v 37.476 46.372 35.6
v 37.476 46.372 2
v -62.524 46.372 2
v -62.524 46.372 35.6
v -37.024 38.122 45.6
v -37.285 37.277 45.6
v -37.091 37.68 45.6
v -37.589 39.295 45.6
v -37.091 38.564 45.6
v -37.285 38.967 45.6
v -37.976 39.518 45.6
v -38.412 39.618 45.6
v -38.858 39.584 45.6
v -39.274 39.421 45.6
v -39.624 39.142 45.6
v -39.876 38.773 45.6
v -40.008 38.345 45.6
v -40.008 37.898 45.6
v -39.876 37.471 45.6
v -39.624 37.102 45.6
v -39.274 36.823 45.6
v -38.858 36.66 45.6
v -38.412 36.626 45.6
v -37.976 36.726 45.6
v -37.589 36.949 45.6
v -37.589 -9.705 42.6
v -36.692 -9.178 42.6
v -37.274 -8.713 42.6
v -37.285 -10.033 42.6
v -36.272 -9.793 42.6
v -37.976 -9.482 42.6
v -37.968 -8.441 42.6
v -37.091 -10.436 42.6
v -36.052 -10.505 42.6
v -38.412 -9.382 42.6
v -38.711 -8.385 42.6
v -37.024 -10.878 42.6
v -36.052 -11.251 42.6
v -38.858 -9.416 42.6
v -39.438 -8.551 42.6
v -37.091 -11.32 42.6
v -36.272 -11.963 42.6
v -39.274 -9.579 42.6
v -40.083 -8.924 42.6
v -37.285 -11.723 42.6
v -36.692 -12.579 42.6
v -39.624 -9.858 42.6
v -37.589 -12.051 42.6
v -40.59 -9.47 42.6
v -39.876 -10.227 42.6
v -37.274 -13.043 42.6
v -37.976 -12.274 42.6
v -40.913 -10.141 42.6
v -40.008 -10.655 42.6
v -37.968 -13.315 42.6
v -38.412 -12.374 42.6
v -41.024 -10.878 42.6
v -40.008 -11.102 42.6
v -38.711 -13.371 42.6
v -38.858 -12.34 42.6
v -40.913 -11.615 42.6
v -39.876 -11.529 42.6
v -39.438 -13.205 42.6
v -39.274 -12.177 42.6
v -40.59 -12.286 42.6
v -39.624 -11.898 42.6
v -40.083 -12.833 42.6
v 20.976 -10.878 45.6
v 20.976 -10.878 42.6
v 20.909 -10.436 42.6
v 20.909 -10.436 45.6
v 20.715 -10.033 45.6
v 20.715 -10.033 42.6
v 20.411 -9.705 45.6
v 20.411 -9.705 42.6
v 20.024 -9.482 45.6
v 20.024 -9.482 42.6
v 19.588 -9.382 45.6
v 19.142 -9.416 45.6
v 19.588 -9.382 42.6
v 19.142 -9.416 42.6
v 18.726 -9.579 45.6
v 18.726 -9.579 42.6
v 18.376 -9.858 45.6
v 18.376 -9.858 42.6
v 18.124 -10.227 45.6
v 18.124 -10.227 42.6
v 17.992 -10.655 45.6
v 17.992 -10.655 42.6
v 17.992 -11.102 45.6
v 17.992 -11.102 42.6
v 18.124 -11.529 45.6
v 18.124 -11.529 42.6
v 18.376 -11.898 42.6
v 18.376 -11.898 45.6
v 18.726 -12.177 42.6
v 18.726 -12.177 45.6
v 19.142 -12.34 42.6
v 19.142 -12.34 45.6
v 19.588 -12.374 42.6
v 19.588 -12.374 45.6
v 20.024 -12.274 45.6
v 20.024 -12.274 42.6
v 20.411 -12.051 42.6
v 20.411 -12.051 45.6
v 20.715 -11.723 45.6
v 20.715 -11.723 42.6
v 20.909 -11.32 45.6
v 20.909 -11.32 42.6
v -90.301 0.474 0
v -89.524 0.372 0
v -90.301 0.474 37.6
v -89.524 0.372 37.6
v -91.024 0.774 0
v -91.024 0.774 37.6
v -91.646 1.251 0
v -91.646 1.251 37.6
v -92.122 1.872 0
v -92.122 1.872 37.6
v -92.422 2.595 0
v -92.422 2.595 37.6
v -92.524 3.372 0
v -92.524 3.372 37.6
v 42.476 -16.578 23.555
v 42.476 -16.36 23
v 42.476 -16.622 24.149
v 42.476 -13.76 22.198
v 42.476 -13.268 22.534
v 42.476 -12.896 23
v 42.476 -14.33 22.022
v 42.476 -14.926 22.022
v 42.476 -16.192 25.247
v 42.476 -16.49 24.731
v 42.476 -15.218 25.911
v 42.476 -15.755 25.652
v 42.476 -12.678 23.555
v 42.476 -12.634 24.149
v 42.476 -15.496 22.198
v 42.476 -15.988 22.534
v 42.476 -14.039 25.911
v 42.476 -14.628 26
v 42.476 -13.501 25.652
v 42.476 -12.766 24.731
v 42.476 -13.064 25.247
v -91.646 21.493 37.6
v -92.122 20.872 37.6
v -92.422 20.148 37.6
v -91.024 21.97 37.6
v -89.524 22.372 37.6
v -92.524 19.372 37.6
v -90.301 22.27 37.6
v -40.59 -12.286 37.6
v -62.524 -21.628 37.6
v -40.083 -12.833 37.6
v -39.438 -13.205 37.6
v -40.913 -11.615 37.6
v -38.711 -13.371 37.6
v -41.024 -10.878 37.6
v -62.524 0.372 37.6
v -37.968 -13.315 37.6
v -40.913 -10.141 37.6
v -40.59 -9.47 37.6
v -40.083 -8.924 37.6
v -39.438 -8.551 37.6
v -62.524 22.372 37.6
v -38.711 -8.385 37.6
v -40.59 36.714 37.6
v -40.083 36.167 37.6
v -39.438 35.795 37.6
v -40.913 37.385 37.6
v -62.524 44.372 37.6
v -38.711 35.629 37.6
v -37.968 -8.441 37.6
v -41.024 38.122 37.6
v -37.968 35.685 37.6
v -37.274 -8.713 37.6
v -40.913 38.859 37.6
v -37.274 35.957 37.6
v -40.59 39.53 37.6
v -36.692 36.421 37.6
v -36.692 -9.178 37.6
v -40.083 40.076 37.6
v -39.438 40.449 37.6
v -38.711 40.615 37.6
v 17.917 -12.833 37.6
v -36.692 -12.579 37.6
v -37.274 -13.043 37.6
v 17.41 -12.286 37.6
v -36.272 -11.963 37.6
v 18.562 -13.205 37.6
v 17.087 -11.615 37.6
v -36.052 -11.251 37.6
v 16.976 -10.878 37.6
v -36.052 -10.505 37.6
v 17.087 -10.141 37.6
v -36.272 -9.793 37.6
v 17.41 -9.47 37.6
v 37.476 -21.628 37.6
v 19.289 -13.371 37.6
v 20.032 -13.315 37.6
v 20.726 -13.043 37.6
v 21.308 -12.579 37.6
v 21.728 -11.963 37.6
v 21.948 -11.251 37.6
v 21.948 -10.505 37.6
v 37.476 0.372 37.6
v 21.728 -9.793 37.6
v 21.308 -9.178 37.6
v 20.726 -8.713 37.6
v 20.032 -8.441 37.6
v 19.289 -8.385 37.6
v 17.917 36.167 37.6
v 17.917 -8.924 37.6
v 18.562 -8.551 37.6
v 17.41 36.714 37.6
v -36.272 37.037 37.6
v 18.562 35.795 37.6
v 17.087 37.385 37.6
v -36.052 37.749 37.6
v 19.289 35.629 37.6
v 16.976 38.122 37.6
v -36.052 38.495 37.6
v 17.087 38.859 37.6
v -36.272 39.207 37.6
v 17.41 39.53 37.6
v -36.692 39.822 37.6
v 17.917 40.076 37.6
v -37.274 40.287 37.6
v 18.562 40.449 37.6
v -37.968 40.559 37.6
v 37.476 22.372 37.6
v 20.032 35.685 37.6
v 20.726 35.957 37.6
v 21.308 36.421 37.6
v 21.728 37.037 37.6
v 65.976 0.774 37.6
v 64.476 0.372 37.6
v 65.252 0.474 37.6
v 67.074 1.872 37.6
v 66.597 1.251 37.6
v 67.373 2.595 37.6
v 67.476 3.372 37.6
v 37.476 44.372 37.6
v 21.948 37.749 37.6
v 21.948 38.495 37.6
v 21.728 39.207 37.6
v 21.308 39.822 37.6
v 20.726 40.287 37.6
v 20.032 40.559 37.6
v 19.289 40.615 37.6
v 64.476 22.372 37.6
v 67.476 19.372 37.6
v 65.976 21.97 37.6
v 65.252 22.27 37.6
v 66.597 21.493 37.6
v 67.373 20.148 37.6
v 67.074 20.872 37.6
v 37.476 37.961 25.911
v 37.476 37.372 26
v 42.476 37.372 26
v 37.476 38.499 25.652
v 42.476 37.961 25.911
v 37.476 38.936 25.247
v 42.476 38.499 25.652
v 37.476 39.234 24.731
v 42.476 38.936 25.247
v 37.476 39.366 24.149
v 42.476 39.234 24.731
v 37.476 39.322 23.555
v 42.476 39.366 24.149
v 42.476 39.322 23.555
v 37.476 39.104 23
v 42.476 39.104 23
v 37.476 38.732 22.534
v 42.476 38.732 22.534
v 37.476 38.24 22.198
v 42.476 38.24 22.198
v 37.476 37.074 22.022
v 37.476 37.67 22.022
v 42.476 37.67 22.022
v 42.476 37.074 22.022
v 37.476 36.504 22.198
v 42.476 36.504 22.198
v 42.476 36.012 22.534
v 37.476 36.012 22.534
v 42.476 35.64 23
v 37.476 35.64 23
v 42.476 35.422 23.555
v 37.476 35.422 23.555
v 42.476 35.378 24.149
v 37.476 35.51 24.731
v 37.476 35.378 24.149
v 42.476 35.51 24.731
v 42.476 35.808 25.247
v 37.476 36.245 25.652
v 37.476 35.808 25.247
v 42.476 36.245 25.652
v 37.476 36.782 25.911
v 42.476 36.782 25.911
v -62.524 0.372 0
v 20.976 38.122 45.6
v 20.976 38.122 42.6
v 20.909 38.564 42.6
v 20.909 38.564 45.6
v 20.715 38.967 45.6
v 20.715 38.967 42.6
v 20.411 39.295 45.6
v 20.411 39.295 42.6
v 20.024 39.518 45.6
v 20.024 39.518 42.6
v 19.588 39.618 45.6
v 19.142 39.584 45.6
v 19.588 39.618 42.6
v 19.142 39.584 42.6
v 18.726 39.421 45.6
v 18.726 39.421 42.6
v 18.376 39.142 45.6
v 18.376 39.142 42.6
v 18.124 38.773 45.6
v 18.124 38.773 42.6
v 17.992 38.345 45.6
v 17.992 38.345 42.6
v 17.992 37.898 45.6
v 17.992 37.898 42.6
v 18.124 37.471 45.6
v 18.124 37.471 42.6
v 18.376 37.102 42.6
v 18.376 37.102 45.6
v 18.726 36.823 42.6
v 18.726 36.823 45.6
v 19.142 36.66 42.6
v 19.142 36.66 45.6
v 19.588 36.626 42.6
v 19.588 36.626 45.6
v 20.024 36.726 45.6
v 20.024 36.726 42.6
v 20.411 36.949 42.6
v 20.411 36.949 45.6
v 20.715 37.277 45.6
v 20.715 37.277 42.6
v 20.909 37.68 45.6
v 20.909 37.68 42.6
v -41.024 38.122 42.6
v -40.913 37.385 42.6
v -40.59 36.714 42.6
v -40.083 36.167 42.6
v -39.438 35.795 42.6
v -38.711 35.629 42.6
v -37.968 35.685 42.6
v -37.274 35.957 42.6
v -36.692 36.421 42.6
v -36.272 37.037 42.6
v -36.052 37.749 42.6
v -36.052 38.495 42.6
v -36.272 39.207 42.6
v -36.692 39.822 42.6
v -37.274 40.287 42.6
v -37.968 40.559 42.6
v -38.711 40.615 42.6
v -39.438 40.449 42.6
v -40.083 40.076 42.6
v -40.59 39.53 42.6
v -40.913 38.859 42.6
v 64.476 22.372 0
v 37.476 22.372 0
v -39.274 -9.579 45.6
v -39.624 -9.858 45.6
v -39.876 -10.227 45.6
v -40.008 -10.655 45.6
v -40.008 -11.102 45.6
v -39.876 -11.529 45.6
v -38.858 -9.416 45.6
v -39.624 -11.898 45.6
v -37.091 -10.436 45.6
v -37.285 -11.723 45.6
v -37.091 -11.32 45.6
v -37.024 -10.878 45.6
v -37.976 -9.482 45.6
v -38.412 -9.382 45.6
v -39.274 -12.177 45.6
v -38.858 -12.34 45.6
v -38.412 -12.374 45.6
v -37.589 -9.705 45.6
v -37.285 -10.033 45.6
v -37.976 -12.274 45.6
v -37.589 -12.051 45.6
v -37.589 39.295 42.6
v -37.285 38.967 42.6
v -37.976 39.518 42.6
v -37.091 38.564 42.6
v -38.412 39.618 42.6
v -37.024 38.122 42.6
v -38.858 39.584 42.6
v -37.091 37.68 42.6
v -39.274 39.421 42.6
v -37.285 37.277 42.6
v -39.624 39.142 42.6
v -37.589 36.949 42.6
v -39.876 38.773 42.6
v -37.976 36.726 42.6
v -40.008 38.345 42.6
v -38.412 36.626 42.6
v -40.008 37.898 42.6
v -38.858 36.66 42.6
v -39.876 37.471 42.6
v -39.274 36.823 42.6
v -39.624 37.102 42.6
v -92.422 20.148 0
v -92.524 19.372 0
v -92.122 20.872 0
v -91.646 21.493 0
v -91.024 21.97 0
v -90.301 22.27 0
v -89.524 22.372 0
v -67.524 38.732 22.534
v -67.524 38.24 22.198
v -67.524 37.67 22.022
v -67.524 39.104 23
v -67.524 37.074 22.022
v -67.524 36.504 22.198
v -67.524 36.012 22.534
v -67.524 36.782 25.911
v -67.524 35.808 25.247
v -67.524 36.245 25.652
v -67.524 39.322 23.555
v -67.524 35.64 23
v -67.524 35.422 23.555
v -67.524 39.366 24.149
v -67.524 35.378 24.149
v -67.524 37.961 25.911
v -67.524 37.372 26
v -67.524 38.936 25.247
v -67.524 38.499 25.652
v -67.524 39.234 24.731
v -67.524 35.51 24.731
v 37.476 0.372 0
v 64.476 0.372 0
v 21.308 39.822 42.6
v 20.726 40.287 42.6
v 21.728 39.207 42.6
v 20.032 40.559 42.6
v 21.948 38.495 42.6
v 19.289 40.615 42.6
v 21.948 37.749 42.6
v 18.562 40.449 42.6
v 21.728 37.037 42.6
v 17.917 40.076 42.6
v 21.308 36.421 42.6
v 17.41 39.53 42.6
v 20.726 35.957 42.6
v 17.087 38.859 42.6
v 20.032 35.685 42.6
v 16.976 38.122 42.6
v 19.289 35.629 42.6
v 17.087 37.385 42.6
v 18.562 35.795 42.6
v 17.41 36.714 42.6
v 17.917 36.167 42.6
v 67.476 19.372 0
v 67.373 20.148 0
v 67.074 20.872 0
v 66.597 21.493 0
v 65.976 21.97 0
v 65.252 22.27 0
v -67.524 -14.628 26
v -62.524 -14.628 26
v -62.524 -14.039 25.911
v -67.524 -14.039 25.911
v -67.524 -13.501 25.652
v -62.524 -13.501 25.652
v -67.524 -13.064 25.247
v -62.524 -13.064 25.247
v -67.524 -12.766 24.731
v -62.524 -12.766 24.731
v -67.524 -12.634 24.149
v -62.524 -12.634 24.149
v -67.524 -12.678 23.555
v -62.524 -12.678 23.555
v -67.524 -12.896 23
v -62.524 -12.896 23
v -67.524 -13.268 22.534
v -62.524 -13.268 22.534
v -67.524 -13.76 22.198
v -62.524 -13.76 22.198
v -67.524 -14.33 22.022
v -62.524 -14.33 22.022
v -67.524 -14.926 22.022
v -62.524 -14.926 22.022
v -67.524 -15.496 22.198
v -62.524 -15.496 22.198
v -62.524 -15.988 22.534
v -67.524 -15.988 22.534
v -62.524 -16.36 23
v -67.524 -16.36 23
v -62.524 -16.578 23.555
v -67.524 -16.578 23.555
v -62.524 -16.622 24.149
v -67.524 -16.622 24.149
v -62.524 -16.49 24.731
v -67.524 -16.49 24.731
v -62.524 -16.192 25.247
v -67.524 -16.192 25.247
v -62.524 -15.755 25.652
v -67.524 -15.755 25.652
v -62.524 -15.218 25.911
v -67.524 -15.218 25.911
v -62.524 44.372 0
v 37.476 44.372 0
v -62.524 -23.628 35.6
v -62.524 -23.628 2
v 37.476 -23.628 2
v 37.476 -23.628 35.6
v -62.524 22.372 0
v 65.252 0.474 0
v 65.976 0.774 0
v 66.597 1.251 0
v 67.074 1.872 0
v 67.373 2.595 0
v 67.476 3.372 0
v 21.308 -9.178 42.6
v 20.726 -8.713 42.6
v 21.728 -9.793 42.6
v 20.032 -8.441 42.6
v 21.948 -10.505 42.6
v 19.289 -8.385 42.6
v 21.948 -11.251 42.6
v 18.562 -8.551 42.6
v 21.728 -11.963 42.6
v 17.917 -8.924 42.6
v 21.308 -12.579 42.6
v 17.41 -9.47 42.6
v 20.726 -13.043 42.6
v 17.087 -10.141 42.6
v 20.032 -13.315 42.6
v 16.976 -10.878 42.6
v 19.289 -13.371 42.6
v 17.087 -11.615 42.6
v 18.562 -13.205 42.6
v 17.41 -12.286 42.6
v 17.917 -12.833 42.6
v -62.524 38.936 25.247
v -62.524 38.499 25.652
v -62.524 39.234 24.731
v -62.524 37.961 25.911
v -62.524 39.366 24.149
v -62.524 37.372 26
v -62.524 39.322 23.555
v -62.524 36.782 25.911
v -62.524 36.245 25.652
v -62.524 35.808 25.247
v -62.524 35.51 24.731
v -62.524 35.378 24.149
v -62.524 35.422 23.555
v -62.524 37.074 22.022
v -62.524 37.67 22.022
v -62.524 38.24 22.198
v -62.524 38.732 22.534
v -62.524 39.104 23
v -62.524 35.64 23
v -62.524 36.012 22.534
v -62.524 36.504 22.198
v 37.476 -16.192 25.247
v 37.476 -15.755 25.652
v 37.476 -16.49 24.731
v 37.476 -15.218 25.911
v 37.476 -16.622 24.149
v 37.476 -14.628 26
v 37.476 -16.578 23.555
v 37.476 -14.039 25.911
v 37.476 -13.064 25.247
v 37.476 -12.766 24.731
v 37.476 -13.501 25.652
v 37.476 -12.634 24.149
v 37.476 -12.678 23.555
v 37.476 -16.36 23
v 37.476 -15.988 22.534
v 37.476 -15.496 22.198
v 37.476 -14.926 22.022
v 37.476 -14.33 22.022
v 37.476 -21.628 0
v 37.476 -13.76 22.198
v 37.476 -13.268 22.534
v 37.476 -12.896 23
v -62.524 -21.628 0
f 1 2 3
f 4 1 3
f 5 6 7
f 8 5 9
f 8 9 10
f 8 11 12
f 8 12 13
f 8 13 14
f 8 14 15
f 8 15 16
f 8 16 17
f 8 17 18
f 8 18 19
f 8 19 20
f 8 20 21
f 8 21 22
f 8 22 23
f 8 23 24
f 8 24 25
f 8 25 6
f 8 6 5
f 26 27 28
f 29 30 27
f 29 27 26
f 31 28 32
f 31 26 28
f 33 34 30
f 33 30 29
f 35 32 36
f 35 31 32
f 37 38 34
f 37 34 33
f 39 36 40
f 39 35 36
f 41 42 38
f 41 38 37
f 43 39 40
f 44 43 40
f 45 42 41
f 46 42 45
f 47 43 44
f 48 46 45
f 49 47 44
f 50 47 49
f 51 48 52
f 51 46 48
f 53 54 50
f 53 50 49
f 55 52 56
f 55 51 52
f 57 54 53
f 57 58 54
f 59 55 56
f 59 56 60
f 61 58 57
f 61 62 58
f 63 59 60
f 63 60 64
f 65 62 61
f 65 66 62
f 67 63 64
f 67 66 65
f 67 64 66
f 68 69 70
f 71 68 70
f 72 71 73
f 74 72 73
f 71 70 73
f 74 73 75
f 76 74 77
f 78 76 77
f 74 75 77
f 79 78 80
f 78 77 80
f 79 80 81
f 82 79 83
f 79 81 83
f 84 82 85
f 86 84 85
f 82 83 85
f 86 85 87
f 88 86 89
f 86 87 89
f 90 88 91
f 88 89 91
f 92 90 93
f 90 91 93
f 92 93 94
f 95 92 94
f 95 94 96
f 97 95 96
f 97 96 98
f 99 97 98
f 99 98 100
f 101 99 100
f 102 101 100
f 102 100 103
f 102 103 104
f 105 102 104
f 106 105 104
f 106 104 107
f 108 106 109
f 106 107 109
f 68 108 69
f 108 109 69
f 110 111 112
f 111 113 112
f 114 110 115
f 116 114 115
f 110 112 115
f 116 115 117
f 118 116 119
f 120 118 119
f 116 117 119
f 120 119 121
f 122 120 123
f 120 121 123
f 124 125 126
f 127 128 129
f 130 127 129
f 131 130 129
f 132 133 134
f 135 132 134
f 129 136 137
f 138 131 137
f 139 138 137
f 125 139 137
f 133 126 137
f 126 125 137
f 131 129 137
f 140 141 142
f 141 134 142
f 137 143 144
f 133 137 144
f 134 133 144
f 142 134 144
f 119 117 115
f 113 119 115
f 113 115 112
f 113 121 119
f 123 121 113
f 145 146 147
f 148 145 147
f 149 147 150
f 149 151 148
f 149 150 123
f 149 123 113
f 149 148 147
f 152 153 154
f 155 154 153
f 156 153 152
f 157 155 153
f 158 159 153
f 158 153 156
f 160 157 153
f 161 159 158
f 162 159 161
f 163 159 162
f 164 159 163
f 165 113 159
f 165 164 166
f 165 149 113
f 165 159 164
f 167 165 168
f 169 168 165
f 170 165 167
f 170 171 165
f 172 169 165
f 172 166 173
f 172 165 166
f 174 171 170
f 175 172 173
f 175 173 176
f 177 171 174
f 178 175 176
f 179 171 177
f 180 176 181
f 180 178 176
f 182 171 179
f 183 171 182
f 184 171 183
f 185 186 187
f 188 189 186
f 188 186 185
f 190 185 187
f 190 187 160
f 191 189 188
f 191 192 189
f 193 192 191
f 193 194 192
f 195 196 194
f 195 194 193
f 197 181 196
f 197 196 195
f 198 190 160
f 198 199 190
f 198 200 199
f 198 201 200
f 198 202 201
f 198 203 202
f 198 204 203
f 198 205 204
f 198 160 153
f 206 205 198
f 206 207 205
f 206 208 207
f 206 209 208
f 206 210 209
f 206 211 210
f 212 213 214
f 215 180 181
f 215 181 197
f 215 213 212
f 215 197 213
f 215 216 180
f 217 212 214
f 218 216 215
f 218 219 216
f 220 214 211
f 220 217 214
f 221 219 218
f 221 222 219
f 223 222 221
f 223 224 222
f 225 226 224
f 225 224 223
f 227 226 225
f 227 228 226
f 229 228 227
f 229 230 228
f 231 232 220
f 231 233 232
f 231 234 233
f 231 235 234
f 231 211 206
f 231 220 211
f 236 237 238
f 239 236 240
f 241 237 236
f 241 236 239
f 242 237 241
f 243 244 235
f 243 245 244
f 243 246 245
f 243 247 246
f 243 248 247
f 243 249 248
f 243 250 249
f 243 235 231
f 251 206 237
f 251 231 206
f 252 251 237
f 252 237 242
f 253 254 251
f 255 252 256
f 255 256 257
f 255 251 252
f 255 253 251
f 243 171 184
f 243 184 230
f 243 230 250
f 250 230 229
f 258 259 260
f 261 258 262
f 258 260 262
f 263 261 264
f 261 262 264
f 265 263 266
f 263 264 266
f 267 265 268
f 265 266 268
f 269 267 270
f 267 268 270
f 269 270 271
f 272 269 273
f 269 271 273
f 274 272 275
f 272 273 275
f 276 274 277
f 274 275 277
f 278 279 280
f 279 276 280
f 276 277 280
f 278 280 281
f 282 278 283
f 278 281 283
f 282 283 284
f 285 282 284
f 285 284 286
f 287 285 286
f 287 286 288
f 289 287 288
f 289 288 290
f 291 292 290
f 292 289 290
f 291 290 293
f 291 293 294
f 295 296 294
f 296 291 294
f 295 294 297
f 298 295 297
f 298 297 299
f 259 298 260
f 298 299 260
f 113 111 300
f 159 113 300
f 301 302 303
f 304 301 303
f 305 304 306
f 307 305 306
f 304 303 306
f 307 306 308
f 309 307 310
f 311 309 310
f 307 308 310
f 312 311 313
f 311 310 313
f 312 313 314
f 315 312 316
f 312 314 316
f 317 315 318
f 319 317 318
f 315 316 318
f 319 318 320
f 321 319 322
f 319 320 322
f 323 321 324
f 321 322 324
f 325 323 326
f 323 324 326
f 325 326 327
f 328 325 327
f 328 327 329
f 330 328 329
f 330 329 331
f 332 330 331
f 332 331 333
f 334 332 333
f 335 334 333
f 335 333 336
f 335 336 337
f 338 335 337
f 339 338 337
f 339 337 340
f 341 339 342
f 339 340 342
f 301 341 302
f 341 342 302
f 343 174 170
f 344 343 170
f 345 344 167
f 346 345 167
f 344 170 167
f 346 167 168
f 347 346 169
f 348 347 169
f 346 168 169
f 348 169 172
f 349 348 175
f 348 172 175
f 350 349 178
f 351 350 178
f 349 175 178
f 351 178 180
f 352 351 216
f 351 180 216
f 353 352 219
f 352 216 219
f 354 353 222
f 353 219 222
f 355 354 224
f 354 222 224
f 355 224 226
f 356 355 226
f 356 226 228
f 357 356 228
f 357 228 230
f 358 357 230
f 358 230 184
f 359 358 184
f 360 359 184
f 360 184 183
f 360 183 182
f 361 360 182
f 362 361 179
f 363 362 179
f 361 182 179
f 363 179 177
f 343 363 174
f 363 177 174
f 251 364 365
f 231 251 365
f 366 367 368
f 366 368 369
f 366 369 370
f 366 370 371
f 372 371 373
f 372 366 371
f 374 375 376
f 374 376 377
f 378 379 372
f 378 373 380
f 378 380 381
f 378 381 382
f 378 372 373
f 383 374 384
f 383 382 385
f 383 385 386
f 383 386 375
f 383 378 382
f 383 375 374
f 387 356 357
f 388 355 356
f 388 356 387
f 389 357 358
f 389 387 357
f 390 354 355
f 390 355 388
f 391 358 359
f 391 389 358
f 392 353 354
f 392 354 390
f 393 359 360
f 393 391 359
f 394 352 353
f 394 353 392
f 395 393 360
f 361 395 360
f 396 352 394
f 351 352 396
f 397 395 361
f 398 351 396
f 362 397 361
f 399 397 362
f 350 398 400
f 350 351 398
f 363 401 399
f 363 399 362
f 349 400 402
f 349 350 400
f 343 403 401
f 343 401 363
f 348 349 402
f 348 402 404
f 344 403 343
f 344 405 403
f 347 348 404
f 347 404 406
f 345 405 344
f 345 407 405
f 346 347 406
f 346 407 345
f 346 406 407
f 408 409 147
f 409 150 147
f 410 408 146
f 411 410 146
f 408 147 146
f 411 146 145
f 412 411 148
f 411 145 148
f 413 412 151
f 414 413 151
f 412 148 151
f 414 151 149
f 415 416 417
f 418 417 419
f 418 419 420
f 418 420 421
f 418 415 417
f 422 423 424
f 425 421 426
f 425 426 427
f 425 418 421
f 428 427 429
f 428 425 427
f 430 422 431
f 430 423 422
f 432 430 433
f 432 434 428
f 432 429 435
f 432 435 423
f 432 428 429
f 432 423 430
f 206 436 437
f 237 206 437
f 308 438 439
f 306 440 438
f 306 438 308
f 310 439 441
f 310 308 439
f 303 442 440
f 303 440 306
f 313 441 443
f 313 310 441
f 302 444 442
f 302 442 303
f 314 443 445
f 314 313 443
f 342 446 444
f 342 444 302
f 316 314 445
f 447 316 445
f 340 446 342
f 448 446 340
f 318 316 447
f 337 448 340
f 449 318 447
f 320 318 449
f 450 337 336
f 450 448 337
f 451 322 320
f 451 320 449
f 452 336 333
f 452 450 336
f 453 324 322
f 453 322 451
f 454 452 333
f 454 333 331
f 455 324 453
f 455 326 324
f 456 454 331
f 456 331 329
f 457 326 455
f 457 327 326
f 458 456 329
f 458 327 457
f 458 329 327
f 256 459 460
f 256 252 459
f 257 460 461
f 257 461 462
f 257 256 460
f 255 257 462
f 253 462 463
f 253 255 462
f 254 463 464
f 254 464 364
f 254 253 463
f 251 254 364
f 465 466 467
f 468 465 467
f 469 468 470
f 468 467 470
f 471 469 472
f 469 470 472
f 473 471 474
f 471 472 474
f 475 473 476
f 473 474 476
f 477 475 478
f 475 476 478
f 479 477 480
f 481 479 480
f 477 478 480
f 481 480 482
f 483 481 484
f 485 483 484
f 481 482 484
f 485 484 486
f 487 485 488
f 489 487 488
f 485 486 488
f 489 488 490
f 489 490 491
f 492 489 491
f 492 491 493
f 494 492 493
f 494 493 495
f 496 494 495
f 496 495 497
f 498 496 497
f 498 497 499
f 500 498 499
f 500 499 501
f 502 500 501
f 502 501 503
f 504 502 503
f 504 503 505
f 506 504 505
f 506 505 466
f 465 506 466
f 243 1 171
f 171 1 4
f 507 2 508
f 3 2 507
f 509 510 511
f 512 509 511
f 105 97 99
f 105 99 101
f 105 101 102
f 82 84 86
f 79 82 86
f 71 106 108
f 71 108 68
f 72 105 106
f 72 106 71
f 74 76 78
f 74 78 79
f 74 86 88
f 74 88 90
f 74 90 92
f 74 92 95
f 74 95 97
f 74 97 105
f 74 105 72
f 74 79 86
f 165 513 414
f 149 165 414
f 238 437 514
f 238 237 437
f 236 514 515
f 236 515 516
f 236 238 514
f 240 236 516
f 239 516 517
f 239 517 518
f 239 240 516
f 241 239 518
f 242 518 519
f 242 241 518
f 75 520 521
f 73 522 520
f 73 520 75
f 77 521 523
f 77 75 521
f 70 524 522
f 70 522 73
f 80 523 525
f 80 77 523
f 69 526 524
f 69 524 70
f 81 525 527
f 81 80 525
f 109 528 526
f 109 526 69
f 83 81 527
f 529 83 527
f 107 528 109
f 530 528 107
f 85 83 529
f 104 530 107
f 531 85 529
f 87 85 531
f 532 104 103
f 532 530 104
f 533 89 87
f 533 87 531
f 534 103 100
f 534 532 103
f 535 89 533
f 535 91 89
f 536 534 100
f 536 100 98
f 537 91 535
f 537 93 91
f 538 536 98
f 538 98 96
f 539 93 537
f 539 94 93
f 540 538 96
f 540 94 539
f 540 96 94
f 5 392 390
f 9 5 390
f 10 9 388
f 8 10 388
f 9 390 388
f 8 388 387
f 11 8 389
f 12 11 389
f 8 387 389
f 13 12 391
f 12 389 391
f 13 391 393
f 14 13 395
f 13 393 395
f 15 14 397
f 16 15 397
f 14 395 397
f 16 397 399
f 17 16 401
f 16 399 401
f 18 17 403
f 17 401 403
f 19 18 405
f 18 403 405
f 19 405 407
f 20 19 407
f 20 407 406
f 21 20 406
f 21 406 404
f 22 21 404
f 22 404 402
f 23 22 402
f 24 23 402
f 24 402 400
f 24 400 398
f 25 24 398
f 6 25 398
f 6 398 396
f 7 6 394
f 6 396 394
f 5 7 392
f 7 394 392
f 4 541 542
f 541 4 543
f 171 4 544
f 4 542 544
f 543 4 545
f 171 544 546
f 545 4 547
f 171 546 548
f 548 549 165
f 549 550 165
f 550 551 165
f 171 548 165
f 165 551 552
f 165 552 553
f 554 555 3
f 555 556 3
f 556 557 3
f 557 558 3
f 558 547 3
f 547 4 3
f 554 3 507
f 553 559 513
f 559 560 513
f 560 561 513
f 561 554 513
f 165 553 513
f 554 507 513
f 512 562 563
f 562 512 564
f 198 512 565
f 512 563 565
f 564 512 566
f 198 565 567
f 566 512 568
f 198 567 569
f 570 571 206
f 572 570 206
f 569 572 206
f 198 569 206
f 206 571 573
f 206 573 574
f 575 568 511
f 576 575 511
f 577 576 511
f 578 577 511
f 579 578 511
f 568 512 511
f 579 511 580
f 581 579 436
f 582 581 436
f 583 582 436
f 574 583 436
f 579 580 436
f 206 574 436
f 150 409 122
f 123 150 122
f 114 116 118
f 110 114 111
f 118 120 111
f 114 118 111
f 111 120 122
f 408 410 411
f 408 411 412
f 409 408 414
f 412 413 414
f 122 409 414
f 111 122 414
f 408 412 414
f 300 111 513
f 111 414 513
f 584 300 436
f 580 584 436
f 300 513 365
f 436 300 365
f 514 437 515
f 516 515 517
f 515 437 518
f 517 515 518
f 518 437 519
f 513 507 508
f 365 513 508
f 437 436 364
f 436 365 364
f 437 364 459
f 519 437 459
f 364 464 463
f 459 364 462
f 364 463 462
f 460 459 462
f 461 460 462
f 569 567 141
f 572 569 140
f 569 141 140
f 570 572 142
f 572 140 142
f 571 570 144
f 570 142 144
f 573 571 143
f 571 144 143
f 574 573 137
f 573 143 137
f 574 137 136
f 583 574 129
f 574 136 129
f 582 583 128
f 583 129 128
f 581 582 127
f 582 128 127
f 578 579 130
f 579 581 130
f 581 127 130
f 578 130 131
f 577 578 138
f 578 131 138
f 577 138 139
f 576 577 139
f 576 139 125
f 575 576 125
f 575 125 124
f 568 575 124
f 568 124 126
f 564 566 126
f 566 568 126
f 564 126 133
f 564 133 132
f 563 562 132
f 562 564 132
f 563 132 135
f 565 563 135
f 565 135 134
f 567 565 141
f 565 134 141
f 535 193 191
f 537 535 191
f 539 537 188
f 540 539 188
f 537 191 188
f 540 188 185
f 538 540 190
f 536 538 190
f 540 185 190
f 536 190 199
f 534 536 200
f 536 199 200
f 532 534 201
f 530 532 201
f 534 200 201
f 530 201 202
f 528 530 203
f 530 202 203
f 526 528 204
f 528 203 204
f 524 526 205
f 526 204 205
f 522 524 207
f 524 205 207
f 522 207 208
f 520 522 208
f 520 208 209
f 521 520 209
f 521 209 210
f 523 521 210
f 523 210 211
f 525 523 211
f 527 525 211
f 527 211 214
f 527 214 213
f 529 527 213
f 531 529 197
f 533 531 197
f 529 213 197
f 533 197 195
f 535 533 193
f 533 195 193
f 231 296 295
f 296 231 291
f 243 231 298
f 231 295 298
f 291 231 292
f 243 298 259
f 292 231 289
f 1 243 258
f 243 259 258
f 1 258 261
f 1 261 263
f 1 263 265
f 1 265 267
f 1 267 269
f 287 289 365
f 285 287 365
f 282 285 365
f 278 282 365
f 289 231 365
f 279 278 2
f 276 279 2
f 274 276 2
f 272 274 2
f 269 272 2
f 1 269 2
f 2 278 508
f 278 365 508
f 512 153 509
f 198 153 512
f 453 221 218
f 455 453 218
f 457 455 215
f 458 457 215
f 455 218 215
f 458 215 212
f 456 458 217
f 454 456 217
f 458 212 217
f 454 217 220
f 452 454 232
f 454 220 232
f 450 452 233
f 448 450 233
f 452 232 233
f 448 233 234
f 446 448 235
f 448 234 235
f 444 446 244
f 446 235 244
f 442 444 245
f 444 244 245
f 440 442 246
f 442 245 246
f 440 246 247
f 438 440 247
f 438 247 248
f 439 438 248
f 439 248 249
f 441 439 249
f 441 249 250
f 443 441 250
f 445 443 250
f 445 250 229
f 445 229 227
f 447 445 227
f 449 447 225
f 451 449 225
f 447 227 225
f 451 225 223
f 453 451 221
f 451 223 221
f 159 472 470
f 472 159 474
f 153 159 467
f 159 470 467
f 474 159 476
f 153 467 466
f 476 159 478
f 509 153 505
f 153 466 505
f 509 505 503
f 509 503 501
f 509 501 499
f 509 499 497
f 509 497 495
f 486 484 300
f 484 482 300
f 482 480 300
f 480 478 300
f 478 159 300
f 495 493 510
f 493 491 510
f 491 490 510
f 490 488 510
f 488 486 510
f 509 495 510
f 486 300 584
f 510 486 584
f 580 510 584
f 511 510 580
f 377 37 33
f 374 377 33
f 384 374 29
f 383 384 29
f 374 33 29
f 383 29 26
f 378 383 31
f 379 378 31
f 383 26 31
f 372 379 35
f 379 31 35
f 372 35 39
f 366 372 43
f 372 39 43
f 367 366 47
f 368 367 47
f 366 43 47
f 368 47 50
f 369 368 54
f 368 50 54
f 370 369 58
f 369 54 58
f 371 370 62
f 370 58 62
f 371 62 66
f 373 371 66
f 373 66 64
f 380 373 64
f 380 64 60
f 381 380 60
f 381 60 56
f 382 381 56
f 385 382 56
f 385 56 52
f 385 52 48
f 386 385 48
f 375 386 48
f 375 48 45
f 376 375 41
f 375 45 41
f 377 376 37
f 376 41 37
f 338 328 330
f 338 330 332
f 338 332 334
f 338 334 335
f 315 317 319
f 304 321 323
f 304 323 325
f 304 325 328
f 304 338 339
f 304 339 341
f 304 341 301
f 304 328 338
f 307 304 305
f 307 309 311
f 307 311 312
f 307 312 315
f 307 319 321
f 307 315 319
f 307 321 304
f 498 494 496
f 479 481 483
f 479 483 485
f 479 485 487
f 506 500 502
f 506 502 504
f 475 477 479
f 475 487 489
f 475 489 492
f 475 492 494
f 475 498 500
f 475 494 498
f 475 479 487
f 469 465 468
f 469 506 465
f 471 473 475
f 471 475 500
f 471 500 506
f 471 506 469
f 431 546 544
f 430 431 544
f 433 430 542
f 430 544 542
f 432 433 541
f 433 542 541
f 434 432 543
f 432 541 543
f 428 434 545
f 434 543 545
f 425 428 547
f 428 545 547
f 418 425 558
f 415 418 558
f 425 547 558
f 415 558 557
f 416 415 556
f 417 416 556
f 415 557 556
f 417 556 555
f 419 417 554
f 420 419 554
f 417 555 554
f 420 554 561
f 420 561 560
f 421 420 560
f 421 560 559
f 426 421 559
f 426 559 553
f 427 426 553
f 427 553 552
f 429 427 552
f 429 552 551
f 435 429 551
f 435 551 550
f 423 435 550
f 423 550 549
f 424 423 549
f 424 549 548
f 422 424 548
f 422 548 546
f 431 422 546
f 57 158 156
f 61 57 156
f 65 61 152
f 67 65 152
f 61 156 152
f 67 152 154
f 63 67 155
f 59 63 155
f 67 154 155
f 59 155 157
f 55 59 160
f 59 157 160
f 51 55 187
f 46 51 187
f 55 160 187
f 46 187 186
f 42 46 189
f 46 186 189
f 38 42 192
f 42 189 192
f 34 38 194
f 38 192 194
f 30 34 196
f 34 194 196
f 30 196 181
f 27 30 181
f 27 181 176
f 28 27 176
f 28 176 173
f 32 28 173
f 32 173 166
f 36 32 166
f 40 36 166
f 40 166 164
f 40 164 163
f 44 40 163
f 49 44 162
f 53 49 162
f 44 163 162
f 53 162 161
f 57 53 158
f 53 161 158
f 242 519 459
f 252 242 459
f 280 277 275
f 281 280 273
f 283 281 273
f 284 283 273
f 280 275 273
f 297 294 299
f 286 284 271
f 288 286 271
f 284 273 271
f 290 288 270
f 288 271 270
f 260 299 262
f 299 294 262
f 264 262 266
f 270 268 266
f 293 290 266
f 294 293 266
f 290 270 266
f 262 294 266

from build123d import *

# Parameters (mm, degrees)
SALIENTE_EXTRUIR1_DEPTH      = 37.6
SALIENTE_EXTRUIR2_DEPTH      = 5
SALIENTE_EXTRUIR2_DEPTH_BACK = 105
CROQUIS2_R                   = 2
REDONDEO1_R                  = 3
CHAFL_N1_SIZE                = 2
CHAFL_N2_SIZE                = 2
REDONDEO2_R                  = 3
CROQUIS3_R                   = 2.5
SALIENTE_EXTRUIR3_DEPTH      = 5
CROQUIS4_R                   = 1.5
SALIENTE_EXTRUIR4_DEPTH      = 3


with BuildPart() as part:
    # Croquis1 → Saliente-Extruir1 (new body)
    with BuildSketch(Plane.XY):
        Polygon((-62.524392651, 0.371914202), (-62.524392651, -23.628085798), (37.475607349, -23.628085798), (37.475607349, 0.371914202), (67.475607349, 0.371914202), (67.475607349, 22.371914202), (37.475607349, 22.371914202), (37.475607349, 46.371914202), (-62.524392651, 46.371914202), (-62.524392651, 22.371914202), (-92.524392651, 22.371914202), (-92.524392651, 0.371914202), align=None)
    extrude(amount=SALIENTE_EXTRUIR1_DEPTH)

    # Croquis2 → Saliente-Extruir2 (add, two sides: drawn at the far end of the back side and taken through both)
    with BuildSketch(Plane.ZY.offset(62.524392651).offset(-SALIENTE_EXTRUIR2_DEPTH_BACK)):
        with Locations((24, -14.628085798)):
            Circle(CROQUIS2_R)
        with Locations((24, 37.371914202)):
            Circle(CROQUIS2_R)
    extrude(amount=SALIENTE_EXTRUIR2_DEPTH + SALIENTE_EXTRUIR2_DEPTH_BACK)

    # Redondeo1
    redondeo1_edges = [part.edges().sort_by_distance(p)[0] for p in [
        (67.475607349, 22.371914202, 18.8),
        (67.475607349, 0.371914202, 18.8),
    ]]
    fillet(redondeo1_edges, radius=REDONDEO1_R)

    # Chaflán1
    chafl_n1_edges = [part.edges().sort_by_distance(p)[0] for p in [
        (-12.524392651, 46.371914202, 0),
        (-12.524392651, -23.628085798, 0),
    ]]
    chamfer(chafl_n1_edges, length=CHAFL_N1_SIZE)

    # Chaflán2
    chafl_n2_edges = [part.edges().sort_by_distance(p)[0] for p in [
        (-12.524392651, -23.628085798, 37.6),
        (-12.524392651, 46.371914202, 37.6),
    ]]
    chamfer(chafl_n2_edges, length=CHAFL_N2_SIZE)

    # Redondeo2
    redondeo2_edges = [part.edges().sort_by_distance(p)[0] for p in [
        (-92.524392651, 0.371914202, 18.8),
        (-92.524392651, 22.371914202, 18.8),
    ]]
    fillet(redondeo2_edges, radius=REDONDEO2_R)

    # Croquis3 → Saliente-Extruir3 (add)
    with BuildSketch(Plane.XY.offset(37.6)):
        with Locations(Location((-38.524392651, 38.121914202, 0), (0, 0, 180))):
            Circle(CROQUIS3_R)
        with Locations(Location((19.475607349, 38.121914202, 0), (0, 0, 180))):
            Circle(CROQUIS3_R)
        with Locations(Location((-38.524392651, -10.878085798, 0), (0, 0, 180))):
            Circle(CROQUIS3_R)
        with Locations(Location((19.475607349, -10.878085798, 0), (0, 0, 180))):
            Circle(CROQUIS3_R)
    extrude(amount=SALIENTE_EXTRUIR3_DEPTH)

    # Croquis4 → Saliente-Extruir4 (add)
    with BuildSketch(Plane.XY.offset(42.6)):
        with Locations((-38.524392651, 38.121914202)):
            Circle(CROQUIS4_R)
        with Locations((19.475607349, 38.121914202)):
            Circle(CROQUIS4_R)
        with Locations((-38.524392651, -10.878085798)):
            Circle(CROQUIS4_R)
        with Locations((19.475607349, -10.878085798)):
            Circle(CROQUIS4_R)
    extrude(amount=SALIENTE_EXTRUIR4_DEPTH)


solid = part.part
